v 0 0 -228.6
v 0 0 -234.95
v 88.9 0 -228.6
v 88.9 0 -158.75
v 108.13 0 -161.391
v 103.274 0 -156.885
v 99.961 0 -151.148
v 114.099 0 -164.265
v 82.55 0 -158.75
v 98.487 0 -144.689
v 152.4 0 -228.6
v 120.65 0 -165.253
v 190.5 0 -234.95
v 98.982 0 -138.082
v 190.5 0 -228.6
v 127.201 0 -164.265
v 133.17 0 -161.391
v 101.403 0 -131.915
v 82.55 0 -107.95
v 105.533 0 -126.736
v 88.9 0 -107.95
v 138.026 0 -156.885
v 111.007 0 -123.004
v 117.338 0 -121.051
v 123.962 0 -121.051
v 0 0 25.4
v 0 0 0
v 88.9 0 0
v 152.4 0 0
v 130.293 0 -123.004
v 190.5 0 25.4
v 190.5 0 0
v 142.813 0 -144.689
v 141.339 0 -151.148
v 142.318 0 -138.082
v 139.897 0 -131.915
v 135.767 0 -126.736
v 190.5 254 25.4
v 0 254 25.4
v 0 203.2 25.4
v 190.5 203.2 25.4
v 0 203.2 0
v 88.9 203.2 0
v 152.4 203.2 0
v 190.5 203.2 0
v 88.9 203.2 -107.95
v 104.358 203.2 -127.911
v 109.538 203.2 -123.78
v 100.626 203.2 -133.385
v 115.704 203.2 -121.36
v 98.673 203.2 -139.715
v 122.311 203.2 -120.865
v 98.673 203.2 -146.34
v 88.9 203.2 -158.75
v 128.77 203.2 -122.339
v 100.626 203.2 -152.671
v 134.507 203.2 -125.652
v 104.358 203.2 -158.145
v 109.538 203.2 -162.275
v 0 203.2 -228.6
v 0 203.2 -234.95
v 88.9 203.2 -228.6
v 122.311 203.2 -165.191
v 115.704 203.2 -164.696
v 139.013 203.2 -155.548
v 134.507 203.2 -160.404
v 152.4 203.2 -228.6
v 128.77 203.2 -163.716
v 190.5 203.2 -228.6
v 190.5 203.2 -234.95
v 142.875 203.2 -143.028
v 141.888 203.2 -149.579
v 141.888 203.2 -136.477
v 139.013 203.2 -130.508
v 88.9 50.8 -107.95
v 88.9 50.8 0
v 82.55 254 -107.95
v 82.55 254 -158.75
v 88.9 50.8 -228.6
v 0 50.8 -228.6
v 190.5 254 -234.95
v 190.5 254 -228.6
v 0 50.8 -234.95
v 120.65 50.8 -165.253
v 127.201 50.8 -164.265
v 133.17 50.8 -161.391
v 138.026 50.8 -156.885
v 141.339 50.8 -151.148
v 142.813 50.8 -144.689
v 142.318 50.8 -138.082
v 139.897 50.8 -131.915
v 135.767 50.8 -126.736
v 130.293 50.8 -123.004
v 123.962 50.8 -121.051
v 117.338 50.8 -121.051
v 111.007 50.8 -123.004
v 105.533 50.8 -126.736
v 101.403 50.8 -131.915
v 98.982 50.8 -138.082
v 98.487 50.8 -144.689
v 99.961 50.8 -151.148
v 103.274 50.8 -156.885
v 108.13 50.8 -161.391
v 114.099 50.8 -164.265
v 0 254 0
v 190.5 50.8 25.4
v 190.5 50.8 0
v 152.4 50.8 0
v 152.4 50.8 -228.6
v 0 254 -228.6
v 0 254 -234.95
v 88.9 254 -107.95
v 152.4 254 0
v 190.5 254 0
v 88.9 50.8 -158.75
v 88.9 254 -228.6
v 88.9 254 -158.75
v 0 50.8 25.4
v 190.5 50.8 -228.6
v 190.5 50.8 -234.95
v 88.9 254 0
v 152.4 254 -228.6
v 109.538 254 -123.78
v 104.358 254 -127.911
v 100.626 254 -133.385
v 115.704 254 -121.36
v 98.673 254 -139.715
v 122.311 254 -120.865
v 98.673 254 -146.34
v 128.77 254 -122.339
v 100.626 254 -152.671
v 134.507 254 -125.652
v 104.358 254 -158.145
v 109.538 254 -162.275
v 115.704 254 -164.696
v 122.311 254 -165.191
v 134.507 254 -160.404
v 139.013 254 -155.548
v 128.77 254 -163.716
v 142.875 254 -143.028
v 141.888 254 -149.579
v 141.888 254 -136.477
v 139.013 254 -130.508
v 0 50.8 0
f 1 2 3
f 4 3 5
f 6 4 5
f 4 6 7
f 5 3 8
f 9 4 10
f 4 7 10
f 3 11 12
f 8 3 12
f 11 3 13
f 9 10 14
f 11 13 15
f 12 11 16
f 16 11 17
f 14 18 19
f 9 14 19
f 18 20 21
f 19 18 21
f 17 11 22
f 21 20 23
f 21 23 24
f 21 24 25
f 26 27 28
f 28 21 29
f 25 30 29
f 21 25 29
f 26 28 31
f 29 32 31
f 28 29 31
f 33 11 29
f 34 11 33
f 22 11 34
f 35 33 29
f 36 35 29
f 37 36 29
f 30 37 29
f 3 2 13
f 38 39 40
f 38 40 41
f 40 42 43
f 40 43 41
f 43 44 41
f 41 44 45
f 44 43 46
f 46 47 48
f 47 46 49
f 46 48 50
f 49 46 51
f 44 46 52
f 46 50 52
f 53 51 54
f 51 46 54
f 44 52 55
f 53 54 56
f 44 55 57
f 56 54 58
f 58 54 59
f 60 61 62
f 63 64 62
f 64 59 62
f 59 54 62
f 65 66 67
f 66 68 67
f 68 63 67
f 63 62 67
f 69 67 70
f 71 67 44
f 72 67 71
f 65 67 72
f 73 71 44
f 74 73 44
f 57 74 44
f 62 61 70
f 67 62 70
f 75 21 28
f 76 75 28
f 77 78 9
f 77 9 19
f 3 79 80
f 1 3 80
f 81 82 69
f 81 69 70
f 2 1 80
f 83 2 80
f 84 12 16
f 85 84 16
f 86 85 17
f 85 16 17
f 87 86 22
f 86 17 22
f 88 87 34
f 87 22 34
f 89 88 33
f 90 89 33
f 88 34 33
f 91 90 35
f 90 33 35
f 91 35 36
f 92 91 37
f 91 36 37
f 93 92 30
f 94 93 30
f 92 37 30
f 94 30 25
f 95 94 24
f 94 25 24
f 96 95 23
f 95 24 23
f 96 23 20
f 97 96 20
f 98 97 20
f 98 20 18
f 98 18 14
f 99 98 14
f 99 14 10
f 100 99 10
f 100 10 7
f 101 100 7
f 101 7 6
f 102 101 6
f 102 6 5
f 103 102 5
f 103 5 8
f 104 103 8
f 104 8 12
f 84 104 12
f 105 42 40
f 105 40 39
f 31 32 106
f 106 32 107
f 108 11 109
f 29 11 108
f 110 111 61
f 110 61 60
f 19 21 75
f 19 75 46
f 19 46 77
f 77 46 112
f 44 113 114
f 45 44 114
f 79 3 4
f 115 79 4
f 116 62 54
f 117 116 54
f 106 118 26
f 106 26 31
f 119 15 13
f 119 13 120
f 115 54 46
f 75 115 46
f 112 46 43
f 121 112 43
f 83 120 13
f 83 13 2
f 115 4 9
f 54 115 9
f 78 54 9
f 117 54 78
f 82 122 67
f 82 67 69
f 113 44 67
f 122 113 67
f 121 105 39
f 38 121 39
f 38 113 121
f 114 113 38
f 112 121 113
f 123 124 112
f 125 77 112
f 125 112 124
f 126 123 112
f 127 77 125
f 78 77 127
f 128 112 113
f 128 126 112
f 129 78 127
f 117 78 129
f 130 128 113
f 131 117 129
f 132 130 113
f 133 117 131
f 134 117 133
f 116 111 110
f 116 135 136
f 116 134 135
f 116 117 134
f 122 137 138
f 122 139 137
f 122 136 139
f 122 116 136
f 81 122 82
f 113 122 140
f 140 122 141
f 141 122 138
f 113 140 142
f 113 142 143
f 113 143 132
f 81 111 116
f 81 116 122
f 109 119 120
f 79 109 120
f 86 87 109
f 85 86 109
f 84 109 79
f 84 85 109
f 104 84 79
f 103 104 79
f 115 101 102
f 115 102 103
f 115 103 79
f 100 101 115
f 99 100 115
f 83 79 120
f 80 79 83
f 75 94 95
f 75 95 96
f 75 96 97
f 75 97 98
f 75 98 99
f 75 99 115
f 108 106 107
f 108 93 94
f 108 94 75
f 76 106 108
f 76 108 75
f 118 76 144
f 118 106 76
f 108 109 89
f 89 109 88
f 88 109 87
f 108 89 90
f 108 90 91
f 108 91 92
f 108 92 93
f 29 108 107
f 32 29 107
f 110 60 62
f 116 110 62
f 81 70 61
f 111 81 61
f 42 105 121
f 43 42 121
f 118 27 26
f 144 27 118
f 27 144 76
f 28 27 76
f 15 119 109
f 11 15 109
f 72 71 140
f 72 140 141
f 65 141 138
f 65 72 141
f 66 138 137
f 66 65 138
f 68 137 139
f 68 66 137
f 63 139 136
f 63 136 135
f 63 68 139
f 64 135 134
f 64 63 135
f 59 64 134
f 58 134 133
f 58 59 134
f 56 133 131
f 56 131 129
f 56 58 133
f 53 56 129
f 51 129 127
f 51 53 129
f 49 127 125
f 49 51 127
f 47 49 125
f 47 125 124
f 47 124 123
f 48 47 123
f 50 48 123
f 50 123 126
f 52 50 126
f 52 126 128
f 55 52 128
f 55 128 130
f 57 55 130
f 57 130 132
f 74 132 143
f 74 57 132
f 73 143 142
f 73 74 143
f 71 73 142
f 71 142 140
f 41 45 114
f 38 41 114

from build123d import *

# Parameters (mm, degrees)
SKETCH1_W           = 190.5
SKETCH1_H           = 50.8
BOSS_EXTRUDE1_DEPTH = 25.4
SKETCH2_W           = 63.5
SKETCH2_H           = 228.6
BOSS_EXTRUDE2_DEPTH = 50.8
SKETCH3_W           = 190.5
SKETCH3_H           = 50.8
BOSS_EXTRUDE3_DEPTH = 6.35
SKETCH4_R           = 22.225
CUT_EXTRUDE1_DEPTH  = 307.712230764
SKETCH5_W           = 50.8
SKETCH5_H           = 254
BOSS_EXTRUDE4_DEPTH = 6.35
LPATTERN2_START     = 203.2
LPATTERN2_OUTLINE_R = 22.225
LPATTERN2_DEPTH     = 50.8
SKETCH6_W           = 190.5
SKETCH6_H           = 50.8
BOSS_EXTRUDE5_DEPTH = 25.4


# Read off the part's stored shape, not the designer's step: LPattern2
with BuildPart() as part:
    # Sketch1 → Boss-Extrude1 (new body)
    with BuildSketch(Plane.XY):
        with Locations((95.25, 25.4)):
            Rectangle(SKETCH1_W, SKETCH1_H)
    extrude(amount=BOSS_EXTRUDE1_DEPTH)

    # Sketch2 → Boss-Extrude2 (add)
    with BuildSketch(Plane.XZ):
        with Locations((120.65, -114.3)):
            Rectangle(SKETCH2_W, SKETCH2_H)
    extrude(amount=-BOSS_EXTRUDE2_DEPTH)

    # Sketch3 → Boss-Extrude3 (add)
    with BuildSketch(Plane(origin=(0, 0, -228.6), x_dir=(-1, 0, 0), z_dir=(0, 0, -1))):
        with Locations((-95.25, 25.4)):
            Rectangle(SKETCH3_W, SKETCH3_H)
    extrude(amount=BOSS_EXTRUDE3_DEPTH)

    # Sketch4 → Cut-Extrude1 (cut, through all)
    with BuildSketch(Plane.XZ):
        with Locations(Location((120.65, -143.027799697, 0), (0, 0, 270))):
            Circle(SKETCH4_R)
    extrude(amount=-CUT_EXTRUDE1_DEPTH, mode=Mode.SUBTRACT)

    # Sketch5 → Boss-Extrude4 (add)
    with BuildSketch(Plane.ZY.offset(-88.9)):
        with Locations((-133.35, 127)):
            Rectangle(SKETCH5_W, SKETCH5_H)
    extrude(amount=BOSS_EXTRUDE4_DEPTH)

    # LPattern2 outline → LPattern2 (add)
    with BuildSketch(Plane(origin=(0, 0, 0), x_dir=(1, 0, 0), z_dir=(0, 1, 0)).offset(LPATTERN2_START)):
        Polygon((88.9, 228.6), (88.9, 0), (152.4, 0), (152.4, 228.6), (190.5, 228.6), (190.5, 234.95), (0, 234.95), (0, 228.6), align=None)
        with Locations((120.65, 143.027799697)):
            Circle(LPATTERN2_OUTLINE_R, mode=Mode.SUBTRACT)
    extrude(amount=LPATTERN2_DEPTH)

    # Sketch6 → Boss-Extrude5 (add)
    with BuildSketch(Plane.XY):
        with Locations((95.25, 228.6)):
            Rectangle(SKETCH6_W, SKETCH6_H)
    extrude(amount=BOSS_EXTRUDE5_DEPTH)


solid = part.part
